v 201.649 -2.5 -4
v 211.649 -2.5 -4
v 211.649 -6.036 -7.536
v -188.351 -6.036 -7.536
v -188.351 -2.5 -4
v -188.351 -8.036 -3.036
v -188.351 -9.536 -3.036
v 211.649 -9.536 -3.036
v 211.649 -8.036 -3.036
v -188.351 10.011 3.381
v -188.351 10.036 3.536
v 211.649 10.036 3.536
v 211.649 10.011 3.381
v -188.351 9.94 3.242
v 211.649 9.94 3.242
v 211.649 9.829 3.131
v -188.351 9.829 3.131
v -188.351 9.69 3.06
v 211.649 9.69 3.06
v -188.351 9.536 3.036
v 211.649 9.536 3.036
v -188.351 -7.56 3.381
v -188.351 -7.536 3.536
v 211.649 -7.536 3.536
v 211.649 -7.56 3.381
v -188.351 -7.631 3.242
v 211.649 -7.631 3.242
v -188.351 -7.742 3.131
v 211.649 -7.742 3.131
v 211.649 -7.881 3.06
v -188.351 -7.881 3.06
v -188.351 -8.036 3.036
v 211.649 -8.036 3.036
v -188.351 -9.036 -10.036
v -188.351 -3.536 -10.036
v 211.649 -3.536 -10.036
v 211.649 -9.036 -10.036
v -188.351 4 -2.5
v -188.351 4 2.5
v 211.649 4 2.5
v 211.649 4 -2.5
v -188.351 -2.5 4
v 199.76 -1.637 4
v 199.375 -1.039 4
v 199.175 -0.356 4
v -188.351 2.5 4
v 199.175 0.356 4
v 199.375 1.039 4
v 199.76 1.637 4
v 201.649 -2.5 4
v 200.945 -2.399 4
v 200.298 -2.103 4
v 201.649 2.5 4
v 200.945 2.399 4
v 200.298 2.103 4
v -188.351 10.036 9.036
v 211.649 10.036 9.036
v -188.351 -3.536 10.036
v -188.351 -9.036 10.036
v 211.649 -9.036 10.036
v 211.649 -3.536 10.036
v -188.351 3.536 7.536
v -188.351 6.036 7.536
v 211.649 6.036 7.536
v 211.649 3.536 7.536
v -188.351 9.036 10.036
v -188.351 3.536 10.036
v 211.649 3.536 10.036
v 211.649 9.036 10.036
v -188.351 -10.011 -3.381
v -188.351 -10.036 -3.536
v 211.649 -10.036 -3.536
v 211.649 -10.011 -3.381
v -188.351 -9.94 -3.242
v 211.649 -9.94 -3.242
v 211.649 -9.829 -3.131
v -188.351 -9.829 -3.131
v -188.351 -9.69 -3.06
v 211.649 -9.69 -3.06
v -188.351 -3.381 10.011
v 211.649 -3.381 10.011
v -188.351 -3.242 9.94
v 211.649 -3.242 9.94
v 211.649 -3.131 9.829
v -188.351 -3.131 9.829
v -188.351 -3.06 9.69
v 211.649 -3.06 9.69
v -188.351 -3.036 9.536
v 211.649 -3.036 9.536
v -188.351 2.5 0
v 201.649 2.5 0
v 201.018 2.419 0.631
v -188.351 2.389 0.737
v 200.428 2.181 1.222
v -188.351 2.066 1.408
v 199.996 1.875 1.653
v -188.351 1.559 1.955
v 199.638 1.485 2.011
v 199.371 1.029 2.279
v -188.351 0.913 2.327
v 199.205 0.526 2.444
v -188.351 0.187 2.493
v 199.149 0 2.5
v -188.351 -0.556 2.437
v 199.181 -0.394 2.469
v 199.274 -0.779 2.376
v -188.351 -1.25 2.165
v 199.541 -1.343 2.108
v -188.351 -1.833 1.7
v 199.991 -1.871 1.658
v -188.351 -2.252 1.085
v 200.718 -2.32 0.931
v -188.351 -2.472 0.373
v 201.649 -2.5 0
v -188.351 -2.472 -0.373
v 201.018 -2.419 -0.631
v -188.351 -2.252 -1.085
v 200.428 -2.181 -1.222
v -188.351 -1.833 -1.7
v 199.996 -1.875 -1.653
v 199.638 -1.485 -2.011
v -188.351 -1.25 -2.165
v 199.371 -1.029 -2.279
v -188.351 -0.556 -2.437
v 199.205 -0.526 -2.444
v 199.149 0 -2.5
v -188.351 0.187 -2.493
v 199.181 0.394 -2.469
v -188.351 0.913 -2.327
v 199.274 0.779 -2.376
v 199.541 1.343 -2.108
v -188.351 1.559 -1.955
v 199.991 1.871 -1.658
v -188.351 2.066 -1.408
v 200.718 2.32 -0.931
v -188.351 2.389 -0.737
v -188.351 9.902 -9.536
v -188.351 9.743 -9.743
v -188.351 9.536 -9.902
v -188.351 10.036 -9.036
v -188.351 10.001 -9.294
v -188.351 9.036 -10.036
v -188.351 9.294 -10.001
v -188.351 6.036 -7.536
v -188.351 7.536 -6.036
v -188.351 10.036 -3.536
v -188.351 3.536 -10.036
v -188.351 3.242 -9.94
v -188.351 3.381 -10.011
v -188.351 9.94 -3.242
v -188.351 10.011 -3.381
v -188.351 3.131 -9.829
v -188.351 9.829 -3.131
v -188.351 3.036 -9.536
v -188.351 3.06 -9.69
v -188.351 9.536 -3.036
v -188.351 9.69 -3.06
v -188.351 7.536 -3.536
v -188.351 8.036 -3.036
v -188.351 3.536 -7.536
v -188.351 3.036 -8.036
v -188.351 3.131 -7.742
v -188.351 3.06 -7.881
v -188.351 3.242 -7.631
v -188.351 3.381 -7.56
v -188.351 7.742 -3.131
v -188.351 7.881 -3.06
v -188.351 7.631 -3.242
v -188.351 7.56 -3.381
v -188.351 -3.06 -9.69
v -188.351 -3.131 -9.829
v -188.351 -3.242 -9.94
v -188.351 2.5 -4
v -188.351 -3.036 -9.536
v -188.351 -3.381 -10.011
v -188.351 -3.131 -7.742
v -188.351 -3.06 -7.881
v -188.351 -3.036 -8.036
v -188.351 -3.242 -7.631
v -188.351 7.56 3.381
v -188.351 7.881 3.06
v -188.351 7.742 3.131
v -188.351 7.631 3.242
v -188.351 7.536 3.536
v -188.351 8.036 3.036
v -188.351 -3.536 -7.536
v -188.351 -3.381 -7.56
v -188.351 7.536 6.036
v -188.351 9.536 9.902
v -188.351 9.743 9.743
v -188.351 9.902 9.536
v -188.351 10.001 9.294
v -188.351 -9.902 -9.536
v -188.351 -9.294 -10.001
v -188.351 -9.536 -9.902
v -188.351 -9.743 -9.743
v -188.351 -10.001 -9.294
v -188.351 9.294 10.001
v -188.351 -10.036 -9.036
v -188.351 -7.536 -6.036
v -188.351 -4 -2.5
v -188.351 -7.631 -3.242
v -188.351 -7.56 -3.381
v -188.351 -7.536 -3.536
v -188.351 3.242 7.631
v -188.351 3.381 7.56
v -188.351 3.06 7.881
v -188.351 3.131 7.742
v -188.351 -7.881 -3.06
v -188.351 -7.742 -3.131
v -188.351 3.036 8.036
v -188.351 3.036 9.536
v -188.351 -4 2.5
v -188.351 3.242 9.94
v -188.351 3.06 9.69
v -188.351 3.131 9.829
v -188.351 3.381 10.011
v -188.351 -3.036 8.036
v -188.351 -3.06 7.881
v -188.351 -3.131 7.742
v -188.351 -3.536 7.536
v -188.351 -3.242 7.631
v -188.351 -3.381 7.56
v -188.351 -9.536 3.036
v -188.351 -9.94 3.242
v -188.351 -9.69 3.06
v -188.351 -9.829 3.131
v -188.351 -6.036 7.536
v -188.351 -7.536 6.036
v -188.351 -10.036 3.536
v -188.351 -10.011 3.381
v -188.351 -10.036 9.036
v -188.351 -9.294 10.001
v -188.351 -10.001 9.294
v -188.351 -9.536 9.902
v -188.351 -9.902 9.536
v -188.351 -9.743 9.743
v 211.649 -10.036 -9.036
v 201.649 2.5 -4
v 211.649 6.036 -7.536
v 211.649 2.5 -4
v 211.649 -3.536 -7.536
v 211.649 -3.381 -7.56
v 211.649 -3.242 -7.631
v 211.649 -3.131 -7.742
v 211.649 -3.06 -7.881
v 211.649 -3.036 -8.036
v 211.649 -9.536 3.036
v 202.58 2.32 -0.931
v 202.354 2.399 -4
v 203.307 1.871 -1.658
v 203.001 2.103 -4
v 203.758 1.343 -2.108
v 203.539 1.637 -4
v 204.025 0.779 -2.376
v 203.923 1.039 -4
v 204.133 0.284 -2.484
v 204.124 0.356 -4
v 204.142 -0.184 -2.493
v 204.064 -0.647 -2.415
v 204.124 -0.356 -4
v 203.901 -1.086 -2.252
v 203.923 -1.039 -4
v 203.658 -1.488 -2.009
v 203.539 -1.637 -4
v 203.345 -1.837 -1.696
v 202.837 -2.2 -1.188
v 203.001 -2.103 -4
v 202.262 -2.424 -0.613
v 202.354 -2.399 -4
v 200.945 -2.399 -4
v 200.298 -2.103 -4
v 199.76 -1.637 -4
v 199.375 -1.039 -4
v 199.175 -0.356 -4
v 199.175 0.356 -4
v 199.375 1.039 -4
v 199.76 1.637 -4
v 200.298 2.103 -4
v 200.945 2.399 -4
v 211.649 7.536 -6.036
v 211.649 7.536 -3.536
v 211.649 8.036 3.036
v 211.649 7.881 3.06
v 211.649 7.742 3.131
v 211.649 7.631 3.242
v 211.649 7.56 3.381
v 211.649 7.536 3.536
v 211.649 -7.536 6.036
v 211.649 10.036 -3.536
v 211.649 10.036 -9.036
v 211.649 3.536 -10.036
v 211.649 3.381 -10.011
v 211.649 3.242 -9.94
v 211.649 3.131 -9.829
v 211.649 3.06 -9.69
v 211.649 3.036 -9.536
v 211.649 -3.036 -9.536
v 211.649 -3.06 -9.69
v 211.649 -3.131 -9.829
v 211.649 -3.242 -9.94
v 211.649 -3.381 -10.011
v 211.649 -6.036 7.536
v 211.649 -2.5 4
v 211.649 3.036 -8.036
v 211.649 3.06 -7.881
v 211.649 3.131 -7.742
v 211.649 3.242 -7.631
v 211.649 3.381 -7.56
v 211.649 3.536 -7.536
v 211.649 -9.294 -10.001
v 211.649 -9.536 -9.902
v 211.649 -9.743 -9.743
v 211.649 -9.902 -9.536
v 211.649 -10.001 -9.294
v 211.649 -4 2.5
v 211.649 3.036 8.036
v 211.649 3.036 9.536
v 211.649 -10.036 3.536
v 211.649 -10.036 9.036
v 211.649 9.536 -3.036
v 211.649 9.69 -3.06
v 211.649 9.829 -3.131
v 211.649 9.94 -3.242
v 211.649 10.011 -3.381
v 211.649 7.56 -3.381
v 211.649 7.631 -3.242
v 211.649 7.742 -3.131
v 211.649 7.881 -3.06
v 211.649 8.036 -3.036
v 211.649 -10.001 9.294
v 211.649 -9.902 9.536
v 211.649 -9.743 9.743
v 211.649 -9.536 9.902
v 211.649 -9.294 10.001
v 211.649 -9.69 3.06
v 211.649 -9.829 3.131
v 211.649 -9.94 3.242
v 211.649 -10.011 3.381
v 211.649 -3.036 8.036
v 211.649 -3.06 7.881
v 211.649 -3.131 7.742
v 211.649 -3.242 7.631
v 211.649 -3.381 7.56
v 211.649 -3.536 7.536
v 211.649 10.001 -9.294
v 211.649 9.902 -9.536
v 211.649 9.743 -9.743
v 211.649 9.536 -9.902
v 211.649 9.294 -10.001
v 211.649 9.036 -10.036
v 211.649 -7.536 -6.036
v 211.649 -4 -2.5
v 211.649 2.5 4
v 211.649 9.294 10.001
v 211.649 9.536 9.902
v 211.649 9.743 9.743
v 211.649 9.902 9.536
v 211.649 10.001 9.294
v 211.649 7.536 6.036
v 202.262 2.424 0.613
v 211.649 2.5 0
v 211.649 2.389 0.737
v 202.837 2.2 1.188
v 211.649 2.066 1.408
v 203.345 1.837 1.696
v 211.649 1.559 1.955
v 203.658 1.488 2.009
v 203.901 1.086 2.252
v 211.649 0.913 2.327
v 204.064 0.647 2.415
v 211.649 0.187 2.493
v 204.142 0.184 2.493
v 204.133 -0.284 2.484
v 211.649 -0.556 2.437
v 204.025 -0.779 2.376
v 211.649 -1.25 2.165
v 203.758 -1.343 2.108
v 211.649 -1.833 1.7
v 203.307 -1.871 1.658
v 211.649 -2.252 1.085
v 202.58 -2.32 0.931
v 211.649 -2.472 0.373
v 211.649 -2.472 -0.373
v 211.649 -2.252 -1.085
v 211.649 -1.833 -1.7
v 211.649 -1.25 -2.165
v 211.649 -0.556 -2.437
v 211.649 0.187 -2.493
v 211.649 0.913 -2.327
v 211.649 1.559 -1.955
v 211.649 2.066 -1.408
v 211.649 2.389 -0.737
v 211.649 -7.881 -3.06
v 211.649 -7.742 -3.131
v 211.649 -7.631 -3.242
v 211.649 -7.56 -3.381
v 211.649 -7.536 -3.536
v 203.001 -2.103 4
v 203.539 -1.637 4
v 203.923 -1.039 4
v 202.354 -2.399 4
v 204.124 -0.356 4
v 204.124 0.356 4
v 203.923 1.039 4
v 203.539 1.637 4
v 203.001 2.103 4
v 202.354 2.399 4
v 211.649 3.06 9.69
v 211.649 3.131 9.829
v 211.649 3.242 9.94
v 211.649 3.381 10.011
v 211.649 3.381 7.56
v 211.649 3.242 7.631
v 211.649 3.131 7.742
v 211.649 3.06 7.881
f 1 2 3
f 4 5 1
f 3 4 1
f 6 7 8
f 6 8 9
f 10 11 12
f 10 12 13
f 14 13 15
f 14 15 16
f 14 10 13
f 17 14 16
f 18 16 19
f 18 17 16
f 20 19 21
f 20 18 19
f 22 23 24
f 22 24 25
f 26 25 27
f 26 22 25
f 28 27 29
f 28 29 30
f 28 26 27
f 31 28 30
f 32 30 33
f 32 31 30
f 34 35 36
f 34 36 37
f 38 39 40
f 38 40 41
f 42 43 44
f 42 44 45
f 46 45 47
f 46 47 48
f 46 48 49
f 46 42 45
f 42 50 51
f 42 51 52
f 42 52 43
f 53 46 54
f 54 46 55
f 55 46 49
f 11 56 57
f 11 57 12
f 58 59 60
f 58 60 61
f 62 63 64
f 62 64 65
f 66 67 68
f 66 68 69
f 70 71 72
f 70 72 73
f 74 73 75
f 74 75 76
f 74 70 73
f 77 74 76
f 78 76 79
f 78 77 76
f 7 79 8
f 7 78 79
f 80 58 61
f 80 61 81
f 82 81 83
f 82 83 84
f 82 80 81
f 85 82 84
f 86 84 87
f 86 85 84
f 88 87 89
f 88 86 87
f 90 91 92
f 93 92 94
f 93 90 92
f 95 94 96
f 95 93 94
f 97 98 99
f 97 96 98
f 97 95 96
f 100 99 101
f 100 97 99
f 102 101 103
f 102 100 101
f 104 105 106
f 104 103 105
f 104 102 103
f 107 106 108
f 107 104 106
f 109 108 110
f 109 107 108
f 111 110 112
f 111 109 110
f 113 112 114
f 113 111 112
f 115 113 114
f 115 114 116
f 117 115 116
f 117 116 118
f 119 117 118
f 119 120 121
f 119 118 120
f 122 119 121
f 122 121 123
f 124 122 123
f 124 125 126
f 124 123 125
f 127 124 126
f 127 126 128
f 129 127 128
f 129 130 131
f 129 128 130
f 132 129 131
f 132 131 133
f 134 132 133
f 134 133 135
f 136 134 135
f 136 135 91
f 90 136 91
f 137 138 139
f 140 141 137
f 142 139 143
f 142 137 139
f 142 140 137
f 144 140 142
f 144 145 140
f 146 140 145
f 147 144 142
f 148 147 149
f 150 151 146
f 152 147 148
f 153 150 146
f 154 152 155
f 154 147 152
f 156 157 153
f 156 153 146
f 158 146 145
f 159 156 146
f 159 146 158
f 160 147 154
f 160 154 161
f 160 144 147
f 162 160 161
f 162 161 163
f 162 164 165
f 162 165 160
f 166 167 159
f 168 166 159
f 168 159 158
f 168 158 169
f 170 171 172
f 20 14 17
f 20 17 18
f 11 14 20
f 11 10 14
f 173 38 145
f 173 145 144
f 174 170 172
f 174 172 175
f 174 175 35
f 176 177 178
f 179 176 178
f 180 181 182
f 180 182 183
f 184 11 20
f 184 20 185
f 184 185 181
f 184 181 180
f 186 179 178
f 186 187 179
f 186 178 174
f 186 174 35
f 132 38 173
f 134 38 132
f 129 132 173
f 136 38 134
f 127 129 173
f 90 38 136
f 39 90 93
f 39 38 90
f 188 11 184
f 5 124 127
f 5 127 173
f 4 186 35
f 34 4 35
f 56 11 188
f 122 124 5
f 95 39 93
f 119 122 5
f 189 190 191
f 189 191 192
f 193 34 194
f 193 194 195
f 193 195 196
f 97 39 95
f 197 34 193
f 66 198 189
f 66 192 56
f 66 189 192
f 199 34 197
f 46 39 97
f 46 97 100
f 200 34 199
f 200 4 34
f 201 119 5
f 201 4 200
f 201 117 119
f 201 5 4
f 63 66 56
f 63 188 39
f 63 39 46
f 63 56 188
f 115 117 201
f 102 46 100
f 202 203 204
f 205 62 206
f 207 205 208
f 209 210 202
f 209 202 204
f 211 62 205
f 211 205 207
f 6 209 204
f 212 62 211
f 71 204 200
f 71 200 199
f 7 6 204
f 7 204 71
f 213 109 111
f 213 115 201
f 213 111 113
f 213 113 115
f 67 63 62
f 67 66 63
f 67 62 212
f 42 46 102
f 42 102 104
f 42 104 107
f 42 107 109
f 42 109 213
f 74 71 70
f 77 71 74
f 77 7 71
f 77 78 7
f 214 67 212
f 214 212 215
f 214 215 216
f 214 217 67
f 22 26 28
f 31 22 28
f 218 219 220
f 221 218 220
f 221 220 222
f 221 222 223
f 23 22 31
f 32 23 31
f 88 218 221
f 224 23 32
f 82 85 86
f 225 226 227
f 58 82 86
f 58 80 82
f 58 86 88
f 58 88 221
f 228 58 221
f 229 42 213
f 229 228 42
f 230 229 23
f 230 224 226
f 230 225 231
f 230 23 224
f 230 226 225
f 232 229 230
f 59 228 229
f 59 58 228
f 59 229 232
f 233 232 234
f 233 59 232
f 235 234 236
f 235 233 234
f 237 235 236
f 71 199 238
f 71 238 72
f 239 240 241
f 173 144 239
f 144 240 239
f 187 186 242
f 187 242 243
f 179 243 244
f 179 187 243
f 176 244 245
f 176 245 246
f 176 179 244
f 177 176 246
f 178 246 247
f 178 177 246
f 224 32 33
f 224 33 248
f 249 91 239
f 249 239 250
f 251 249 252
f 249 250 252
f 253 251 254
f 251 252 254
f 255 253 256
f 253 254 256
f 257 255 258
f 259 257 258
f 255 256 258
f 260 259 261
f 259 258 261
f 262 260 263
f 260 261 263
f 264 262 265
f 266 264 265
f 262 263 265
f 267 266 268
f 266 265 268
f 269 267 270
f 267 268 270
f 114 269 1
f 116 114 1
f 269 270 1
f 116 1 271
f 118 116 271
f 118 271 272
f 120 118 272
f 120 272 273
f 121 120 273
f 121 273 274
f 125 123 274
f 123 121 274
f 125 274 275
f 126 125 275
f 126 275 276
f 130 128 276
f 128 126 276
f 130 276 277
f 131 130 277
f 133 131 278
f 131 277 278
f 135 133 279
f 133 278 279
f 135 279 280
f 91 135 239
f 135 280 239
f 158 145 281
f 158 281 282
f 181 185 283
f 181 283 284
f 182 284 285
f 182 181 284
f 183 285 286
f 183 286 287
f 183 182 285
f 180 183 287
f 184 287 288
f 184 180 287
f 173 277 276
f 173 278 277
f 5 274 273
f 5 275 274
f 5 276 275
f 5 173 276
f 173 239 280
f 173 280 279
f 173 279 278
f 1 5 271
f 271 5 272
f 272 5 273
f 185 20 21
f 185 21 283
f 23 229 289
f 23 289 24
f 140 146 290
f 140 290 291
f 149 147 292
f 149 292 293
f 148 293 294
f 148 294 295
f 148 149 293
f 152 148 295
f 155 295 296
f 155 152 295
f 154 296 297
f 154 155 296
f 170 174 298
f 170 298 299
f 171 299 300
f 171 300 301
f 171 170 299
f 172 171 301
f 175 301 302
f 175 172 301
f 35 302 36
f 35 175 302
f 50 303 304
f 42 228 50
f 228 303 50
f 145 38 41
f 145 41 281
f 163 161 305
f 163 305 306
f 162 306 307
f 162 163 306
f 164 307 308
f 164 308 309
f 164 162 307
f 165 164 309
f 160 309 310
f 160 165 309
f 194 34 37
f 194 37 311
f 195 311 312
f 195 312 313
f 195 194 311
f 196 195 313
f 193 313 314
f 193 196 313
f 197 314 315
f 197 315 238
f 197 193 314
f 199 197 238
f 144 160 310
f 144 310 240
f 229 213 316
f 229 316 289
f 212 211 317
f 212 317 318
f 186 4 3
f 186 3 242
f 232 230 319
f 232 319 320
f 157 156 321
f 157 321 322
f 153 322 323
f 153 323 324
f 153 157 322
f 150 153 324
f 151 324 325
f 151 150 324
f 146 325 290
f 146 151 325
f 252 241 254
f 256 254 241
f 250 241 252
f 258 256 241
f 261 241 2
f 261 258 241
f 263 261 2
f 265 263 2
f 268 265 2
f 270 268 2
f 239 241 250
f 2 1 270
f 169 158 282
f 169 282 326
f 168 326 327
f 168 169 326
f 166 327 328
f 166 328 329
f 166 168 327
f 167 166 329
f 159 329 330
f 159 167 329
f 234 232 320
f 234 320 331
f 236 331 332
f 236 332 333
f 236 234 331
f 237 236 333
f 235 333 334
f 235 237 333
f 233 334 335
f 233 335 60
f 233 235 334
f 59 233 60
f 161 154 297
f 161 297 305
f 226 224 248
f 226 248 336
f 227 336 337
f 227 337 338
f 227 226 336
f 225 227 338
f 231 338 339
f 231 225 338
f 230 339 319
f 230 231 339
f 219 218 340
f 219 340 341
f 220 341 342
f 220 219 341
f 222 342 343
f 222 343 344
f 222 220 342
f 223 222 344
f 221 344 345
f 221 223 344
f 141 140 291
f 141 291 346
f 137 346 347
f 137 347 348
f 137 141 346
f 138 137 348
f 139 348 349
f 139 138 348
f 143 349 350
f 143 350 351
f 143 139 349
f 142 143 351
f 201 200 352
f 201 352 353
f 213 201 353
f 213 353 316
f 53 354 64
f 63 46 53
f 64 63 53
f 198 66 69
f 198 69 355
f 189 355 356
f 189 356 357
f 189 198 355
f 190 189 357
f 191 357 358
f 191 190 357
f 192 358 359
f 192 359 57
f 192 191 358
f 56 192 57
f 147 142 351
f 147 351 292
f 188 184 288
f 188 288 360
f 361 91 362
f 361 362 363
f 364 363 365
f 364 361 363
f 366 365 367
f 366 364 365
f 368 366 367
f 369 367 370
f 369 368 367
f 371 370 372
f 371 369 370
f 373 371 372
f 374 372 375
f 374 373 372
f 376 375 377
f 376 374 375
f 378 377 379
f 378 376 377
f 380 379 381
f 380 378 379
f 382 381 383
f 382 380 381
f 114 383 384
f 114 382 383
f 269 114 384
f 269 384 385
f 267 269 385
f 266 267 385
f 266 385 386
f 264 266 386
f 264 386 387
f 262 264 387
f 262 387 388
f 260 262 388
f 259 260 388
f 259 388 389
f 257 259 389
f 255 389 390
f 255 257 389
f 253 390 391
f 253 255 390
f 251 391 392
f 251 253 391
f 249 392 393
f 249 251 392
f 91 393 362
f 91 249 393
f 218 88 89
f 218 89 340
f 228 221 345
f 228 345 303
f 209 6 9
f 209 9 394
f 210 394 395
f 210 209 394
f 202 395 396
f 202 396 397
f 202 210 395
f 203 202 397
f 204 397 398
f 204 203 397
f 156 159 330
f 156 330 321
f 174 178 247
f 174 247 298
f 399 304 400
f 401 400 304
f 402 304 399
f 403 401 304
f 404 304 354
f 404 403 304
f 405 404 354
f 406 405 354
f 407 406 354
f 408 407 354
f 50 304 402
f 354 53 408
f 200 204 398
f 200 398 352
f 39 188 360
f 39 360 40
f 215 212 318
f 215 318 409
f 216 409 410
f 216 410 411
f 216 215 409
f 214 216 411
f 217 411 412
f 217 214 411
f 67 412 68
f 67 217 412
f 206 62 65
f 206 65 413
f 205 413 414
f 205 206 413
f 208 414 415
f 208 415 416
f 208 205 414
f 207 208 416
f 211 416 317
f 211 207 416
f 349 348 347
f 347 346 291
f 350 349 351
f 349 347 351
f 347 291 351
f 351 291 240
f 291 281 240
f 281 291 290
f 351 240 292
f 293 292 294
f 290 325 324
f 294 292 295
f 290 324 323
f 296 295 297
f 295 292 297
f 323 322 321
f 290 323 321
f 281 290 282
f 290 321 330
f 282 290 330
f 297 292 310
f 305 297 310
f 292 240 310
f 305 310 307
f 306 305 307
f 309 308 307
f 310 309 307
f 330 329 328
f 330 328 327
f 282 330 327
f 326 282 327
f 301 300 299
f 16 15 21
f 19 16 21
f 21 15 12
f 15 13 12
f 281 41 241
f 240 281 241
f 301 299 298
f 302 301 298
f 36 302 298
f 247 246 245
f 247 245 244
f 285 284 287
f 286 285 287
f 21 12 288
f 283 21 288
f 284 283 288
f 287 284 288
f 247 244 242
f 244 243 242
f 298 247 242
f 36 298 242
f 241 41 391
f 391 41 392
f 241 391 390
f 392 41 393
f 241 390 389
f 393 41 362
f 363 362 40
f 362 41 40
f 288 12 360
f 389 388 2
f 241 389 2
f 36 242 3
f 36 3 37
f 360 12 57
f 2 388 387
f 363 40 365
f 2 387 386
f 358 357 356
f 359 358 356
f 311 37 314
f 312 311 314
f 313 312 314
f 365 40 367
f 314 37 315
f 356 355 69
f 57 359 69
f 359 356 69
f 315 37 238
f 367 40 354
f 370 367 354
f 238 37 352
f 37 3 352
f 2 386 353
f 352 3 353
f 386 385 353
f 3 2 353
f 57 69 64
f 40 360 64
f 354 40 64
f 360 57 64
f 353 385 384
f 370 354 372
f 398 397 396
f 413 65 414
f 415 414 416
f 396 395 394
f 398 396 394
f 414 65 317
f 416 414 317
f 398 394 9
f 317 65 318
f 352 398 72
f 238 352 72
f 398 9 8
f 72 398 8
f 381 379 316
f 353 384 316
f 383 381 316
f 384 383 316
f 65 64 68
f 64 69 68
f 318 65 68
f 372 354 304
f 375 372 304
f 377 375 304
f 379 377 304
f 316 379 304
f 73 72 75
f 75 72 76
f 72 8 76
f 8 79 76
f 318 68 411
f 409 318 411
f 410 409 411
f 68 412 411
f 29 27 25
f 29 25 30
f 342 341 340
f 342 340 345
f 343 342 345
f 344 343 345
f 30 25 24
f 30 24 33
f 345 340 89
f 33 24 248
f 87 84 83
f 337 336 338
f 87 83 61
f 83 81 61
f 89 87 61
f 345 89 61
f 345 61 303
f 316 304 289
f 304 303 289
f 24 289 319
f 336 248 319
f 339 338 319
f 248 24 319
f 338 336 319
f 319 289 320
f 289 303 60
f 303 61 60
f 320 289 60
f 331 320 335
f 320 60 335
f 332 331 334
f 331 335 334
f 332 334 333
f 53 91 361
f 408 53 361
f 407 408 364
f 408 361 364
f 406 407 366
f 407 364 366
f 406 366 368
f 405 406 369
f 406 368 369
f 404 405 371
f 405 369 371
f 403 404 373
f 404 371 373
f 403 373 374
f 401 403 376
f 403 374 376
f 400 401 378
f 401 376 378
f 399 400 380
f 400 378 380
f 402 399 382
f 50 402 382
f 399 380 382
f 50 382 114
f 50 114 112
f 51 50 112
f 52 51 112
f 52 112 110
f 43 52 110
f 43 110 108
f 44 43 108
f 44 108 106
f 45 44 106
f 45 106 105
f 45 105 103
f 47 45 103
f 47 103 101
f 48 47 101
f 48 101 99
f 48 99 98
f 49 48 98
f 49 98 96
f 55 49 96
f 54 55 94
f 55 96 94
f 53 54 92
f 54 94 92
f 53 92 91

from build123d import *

# Parameters (mm, degrees)
SKETCH11_R                            = 2.5
ALUMINIUM_PROF_ALUMINIUM_PROF_1_DEPTH = 400
SKETCH12_R                            = 2.5
CUT_EXTRUDE1_DEPTH                    = 10


with BuildPart() as part:
    # Sketch11 → Aluminium prof ALUMINIUM PROF(1) (new body)
    with BuildSketch(Plane.YZ.offset(-188.350798937)):
        with BuildLine():
            Line((-2.5, 4), (2.5, 4))
            Line((2.5, 4), (6.035533906, 7.535533906))
            Line((6.035533906, 7.535533906), (3.535533906, 7.535533906))
            ThreePointArc((3.535533906, 7.535533906), (3.181980515, 7.681980515), (3.035533906, 8.035533906))
            Line((3.035533906, 8.035533906), (3.035533906, 9.535533906))
            ThreePointArc((3.035533906, 9.535533906), (3.181980515, 9.889087297), (3.535533906, 10.035533906))
            Line((3.535533906, 10.035533906), (9.035533906, 10.035533906))
            ThreePointArc((9.035533906, 10.035533906), (9.742640687, 9.742640687), (10.035533906, 9.035533906))
            Line((10.035533906, 9.035533906), (10.035533906, 3.535533906))
            ThreePointArc((10.035533906, 3.535533906), (9.889087297, 3.181980515), (9.535533906, 3.035533906))
            Line((9.535533906, 3.035533906), (8.035533906, 3.035533906))
            ThreePointArc((8.035533906, 3.035533906), (7.681980515, 3.181980515), (7.535533906, 3.535533906))
            Line((7.535533906, 3.535533906), (7.535533906, 6.035533906))
            Line((7.535533906, 6.035533906), (4, 2.5))
            Line((4, 2.5), (4, -2.5))
            Line((4, -2.5), (7.535533906, -6.035533906))
            Line((7.535533906, -6.035533906), (7.535533906, -3.535533906))
            ThreePointArc((7.535533906, -3.535533906), (7.681980515, -3.181980515), (8.035533906, -3.035533906))
            Line((8.035533906, -3.035533906), (9.535533906, -3.035533906))
            ThreePointArc((9.535533906, -3.035533906), (9.889087297, -3.181980515), (10.035533906, -3.535533906))
            Line((10.035533906, -3.535533906), (10.035533906, -9.035533906))
            ThreePointArc((10.035533906, -9.035533906), (9.742640687, -9.742640687), (9.035533906, -10.035533906))
            Line((9.035533906, -10.035533906), (3.535533906, -10.035533906))
            ThreePointArc((3.535533906, -10.035533906), (3.181980515, -9.889087297), (3.035533906, -9.535533906))
            Line((3.035533906, -9.535533906), (3.035533906, -8.035533906))
            ThreePointArc((3.035533906, -8.035533906), (3.181980515, -7.681980515), (3.535533906, -7.535533906))
            Line((3.535533906, -7.535533906), (6.035533906, -7.535533906))
            Line((6.035533906, -7.535533906), (2.5, -4))
            Line((2.5, -4), (-2.5, -4))
            Line((-2.5, -4), (-6.035533906, -7.535533906))
            Line((-6.035533906, -7.535533906), (-3.535533906, -7.535533906))
            ThreePointArc((-3.535533906, -7.535533906), (-3.181980515, -7.681980515), (-3.035533906, -8.035533906))
            Line((-3.035533906, -8.035533906), (-3.035533906, -9.535533906))
            ThreePointArc((-3.035533906, -9.535533906), (-3.181980515, -9.889087297), (-3.535533906, -10.035533906))
            Line((-3.535533906, -10.035533906), (-9.035533906, -10.035533906))
            ThreePointArc((-9.035533906, -10.035533906), (-9.742640687, -9.742640687), (-10.035533906, -9.035533906))
            Line((-10.035533906, -9.035533906), (-10.035533906, -3.535533906))
            ThreePointArc((-10.035533906, -3.535533906), (-9.889087297, -3.181980515), (-9.535533906, -3.035533906))
            Line((-9.535533906, -3.035533906), (-8.035533906, -3.035533906))
            ThreePointArc((-8.035533906, -3.035533906), (-7.681980515, -3.181980515), (-7.535533906, -3.535533906))
            Line((-7.535533906, -3.535533906), (-7.535533906, -6.035533906))
            Line((-7.535533906, -6.035533906), (-4, -2.5))
            Line((-4, -2.5), (-4, 2.5))
            Line((-4, 2.5), (-7.535533906, 6.035533906))
            Line((-7.535533906, 6.035533906), (-7.535533906, 3.535533906))
            ThreePointArc((-7.535533906, 3.535533906), (-7.681980515, 3.181980515), (-8.035533906, 3.035533906))
            Line((-8.035533906, 3.035533906), (-9.535533906, 3.035533906))
            ThreePointArc((-9.535533906, 3.035533906), (-9.889087297, 3.181980515), (-10.035533906, 3.535533906))
            Line((-10.035533906, 3.535533906), (-10.035533906, 9.035533906))
            ThreePointArc((-10.035533906, 9.035533906), (-9.742640687, 9.742640687), (-9.035533906, 10.035533906))
            Line((-9.035533906, 10.035533906), (-3.535533906, 10.035533906))
            ThreePointArc((-3.535533906, 10.035533906), (-3.181980515, 9.889087297), (-3.035533906, 9.535533906))
            Line((-3.035533906, 9.535533906), (-3.035533906, 8.035533906))
            ThreePointArc((-3.035533906, 8.035533906), (-3.181980515, 7.681980515), (-3.535533906, 7.535533906))
            Line((-3.535533906, 7.535533906), (-6.035533906, 7.535533906))
            Line((-6.035533906, 7.535533906), (-2.5, 4))
        make_face()
        Circle(SKETCH11_R, mode=Mode.SUBTRACT)
    extrude(amount=ALUMINIUM_PROF_ALUMINIUM_PROF_1_DEPTH)

    # Sketch12 → Cut-Extrude1 (cut)
    with BuildSketch(Plane(origin=(0, 0, -4), x_dir=(-1, 0, 0), z_dir=(0, 0, -1))):
        with Locations(Location((-201.649201063, 0, 0), (0, 0, 90))):
            Circle(SKETCH12_R)
    extrude(amount=-CUT_EXTRUDE1_DEPTH, mode=Mode.SUBTRACT)


solid = part.part
